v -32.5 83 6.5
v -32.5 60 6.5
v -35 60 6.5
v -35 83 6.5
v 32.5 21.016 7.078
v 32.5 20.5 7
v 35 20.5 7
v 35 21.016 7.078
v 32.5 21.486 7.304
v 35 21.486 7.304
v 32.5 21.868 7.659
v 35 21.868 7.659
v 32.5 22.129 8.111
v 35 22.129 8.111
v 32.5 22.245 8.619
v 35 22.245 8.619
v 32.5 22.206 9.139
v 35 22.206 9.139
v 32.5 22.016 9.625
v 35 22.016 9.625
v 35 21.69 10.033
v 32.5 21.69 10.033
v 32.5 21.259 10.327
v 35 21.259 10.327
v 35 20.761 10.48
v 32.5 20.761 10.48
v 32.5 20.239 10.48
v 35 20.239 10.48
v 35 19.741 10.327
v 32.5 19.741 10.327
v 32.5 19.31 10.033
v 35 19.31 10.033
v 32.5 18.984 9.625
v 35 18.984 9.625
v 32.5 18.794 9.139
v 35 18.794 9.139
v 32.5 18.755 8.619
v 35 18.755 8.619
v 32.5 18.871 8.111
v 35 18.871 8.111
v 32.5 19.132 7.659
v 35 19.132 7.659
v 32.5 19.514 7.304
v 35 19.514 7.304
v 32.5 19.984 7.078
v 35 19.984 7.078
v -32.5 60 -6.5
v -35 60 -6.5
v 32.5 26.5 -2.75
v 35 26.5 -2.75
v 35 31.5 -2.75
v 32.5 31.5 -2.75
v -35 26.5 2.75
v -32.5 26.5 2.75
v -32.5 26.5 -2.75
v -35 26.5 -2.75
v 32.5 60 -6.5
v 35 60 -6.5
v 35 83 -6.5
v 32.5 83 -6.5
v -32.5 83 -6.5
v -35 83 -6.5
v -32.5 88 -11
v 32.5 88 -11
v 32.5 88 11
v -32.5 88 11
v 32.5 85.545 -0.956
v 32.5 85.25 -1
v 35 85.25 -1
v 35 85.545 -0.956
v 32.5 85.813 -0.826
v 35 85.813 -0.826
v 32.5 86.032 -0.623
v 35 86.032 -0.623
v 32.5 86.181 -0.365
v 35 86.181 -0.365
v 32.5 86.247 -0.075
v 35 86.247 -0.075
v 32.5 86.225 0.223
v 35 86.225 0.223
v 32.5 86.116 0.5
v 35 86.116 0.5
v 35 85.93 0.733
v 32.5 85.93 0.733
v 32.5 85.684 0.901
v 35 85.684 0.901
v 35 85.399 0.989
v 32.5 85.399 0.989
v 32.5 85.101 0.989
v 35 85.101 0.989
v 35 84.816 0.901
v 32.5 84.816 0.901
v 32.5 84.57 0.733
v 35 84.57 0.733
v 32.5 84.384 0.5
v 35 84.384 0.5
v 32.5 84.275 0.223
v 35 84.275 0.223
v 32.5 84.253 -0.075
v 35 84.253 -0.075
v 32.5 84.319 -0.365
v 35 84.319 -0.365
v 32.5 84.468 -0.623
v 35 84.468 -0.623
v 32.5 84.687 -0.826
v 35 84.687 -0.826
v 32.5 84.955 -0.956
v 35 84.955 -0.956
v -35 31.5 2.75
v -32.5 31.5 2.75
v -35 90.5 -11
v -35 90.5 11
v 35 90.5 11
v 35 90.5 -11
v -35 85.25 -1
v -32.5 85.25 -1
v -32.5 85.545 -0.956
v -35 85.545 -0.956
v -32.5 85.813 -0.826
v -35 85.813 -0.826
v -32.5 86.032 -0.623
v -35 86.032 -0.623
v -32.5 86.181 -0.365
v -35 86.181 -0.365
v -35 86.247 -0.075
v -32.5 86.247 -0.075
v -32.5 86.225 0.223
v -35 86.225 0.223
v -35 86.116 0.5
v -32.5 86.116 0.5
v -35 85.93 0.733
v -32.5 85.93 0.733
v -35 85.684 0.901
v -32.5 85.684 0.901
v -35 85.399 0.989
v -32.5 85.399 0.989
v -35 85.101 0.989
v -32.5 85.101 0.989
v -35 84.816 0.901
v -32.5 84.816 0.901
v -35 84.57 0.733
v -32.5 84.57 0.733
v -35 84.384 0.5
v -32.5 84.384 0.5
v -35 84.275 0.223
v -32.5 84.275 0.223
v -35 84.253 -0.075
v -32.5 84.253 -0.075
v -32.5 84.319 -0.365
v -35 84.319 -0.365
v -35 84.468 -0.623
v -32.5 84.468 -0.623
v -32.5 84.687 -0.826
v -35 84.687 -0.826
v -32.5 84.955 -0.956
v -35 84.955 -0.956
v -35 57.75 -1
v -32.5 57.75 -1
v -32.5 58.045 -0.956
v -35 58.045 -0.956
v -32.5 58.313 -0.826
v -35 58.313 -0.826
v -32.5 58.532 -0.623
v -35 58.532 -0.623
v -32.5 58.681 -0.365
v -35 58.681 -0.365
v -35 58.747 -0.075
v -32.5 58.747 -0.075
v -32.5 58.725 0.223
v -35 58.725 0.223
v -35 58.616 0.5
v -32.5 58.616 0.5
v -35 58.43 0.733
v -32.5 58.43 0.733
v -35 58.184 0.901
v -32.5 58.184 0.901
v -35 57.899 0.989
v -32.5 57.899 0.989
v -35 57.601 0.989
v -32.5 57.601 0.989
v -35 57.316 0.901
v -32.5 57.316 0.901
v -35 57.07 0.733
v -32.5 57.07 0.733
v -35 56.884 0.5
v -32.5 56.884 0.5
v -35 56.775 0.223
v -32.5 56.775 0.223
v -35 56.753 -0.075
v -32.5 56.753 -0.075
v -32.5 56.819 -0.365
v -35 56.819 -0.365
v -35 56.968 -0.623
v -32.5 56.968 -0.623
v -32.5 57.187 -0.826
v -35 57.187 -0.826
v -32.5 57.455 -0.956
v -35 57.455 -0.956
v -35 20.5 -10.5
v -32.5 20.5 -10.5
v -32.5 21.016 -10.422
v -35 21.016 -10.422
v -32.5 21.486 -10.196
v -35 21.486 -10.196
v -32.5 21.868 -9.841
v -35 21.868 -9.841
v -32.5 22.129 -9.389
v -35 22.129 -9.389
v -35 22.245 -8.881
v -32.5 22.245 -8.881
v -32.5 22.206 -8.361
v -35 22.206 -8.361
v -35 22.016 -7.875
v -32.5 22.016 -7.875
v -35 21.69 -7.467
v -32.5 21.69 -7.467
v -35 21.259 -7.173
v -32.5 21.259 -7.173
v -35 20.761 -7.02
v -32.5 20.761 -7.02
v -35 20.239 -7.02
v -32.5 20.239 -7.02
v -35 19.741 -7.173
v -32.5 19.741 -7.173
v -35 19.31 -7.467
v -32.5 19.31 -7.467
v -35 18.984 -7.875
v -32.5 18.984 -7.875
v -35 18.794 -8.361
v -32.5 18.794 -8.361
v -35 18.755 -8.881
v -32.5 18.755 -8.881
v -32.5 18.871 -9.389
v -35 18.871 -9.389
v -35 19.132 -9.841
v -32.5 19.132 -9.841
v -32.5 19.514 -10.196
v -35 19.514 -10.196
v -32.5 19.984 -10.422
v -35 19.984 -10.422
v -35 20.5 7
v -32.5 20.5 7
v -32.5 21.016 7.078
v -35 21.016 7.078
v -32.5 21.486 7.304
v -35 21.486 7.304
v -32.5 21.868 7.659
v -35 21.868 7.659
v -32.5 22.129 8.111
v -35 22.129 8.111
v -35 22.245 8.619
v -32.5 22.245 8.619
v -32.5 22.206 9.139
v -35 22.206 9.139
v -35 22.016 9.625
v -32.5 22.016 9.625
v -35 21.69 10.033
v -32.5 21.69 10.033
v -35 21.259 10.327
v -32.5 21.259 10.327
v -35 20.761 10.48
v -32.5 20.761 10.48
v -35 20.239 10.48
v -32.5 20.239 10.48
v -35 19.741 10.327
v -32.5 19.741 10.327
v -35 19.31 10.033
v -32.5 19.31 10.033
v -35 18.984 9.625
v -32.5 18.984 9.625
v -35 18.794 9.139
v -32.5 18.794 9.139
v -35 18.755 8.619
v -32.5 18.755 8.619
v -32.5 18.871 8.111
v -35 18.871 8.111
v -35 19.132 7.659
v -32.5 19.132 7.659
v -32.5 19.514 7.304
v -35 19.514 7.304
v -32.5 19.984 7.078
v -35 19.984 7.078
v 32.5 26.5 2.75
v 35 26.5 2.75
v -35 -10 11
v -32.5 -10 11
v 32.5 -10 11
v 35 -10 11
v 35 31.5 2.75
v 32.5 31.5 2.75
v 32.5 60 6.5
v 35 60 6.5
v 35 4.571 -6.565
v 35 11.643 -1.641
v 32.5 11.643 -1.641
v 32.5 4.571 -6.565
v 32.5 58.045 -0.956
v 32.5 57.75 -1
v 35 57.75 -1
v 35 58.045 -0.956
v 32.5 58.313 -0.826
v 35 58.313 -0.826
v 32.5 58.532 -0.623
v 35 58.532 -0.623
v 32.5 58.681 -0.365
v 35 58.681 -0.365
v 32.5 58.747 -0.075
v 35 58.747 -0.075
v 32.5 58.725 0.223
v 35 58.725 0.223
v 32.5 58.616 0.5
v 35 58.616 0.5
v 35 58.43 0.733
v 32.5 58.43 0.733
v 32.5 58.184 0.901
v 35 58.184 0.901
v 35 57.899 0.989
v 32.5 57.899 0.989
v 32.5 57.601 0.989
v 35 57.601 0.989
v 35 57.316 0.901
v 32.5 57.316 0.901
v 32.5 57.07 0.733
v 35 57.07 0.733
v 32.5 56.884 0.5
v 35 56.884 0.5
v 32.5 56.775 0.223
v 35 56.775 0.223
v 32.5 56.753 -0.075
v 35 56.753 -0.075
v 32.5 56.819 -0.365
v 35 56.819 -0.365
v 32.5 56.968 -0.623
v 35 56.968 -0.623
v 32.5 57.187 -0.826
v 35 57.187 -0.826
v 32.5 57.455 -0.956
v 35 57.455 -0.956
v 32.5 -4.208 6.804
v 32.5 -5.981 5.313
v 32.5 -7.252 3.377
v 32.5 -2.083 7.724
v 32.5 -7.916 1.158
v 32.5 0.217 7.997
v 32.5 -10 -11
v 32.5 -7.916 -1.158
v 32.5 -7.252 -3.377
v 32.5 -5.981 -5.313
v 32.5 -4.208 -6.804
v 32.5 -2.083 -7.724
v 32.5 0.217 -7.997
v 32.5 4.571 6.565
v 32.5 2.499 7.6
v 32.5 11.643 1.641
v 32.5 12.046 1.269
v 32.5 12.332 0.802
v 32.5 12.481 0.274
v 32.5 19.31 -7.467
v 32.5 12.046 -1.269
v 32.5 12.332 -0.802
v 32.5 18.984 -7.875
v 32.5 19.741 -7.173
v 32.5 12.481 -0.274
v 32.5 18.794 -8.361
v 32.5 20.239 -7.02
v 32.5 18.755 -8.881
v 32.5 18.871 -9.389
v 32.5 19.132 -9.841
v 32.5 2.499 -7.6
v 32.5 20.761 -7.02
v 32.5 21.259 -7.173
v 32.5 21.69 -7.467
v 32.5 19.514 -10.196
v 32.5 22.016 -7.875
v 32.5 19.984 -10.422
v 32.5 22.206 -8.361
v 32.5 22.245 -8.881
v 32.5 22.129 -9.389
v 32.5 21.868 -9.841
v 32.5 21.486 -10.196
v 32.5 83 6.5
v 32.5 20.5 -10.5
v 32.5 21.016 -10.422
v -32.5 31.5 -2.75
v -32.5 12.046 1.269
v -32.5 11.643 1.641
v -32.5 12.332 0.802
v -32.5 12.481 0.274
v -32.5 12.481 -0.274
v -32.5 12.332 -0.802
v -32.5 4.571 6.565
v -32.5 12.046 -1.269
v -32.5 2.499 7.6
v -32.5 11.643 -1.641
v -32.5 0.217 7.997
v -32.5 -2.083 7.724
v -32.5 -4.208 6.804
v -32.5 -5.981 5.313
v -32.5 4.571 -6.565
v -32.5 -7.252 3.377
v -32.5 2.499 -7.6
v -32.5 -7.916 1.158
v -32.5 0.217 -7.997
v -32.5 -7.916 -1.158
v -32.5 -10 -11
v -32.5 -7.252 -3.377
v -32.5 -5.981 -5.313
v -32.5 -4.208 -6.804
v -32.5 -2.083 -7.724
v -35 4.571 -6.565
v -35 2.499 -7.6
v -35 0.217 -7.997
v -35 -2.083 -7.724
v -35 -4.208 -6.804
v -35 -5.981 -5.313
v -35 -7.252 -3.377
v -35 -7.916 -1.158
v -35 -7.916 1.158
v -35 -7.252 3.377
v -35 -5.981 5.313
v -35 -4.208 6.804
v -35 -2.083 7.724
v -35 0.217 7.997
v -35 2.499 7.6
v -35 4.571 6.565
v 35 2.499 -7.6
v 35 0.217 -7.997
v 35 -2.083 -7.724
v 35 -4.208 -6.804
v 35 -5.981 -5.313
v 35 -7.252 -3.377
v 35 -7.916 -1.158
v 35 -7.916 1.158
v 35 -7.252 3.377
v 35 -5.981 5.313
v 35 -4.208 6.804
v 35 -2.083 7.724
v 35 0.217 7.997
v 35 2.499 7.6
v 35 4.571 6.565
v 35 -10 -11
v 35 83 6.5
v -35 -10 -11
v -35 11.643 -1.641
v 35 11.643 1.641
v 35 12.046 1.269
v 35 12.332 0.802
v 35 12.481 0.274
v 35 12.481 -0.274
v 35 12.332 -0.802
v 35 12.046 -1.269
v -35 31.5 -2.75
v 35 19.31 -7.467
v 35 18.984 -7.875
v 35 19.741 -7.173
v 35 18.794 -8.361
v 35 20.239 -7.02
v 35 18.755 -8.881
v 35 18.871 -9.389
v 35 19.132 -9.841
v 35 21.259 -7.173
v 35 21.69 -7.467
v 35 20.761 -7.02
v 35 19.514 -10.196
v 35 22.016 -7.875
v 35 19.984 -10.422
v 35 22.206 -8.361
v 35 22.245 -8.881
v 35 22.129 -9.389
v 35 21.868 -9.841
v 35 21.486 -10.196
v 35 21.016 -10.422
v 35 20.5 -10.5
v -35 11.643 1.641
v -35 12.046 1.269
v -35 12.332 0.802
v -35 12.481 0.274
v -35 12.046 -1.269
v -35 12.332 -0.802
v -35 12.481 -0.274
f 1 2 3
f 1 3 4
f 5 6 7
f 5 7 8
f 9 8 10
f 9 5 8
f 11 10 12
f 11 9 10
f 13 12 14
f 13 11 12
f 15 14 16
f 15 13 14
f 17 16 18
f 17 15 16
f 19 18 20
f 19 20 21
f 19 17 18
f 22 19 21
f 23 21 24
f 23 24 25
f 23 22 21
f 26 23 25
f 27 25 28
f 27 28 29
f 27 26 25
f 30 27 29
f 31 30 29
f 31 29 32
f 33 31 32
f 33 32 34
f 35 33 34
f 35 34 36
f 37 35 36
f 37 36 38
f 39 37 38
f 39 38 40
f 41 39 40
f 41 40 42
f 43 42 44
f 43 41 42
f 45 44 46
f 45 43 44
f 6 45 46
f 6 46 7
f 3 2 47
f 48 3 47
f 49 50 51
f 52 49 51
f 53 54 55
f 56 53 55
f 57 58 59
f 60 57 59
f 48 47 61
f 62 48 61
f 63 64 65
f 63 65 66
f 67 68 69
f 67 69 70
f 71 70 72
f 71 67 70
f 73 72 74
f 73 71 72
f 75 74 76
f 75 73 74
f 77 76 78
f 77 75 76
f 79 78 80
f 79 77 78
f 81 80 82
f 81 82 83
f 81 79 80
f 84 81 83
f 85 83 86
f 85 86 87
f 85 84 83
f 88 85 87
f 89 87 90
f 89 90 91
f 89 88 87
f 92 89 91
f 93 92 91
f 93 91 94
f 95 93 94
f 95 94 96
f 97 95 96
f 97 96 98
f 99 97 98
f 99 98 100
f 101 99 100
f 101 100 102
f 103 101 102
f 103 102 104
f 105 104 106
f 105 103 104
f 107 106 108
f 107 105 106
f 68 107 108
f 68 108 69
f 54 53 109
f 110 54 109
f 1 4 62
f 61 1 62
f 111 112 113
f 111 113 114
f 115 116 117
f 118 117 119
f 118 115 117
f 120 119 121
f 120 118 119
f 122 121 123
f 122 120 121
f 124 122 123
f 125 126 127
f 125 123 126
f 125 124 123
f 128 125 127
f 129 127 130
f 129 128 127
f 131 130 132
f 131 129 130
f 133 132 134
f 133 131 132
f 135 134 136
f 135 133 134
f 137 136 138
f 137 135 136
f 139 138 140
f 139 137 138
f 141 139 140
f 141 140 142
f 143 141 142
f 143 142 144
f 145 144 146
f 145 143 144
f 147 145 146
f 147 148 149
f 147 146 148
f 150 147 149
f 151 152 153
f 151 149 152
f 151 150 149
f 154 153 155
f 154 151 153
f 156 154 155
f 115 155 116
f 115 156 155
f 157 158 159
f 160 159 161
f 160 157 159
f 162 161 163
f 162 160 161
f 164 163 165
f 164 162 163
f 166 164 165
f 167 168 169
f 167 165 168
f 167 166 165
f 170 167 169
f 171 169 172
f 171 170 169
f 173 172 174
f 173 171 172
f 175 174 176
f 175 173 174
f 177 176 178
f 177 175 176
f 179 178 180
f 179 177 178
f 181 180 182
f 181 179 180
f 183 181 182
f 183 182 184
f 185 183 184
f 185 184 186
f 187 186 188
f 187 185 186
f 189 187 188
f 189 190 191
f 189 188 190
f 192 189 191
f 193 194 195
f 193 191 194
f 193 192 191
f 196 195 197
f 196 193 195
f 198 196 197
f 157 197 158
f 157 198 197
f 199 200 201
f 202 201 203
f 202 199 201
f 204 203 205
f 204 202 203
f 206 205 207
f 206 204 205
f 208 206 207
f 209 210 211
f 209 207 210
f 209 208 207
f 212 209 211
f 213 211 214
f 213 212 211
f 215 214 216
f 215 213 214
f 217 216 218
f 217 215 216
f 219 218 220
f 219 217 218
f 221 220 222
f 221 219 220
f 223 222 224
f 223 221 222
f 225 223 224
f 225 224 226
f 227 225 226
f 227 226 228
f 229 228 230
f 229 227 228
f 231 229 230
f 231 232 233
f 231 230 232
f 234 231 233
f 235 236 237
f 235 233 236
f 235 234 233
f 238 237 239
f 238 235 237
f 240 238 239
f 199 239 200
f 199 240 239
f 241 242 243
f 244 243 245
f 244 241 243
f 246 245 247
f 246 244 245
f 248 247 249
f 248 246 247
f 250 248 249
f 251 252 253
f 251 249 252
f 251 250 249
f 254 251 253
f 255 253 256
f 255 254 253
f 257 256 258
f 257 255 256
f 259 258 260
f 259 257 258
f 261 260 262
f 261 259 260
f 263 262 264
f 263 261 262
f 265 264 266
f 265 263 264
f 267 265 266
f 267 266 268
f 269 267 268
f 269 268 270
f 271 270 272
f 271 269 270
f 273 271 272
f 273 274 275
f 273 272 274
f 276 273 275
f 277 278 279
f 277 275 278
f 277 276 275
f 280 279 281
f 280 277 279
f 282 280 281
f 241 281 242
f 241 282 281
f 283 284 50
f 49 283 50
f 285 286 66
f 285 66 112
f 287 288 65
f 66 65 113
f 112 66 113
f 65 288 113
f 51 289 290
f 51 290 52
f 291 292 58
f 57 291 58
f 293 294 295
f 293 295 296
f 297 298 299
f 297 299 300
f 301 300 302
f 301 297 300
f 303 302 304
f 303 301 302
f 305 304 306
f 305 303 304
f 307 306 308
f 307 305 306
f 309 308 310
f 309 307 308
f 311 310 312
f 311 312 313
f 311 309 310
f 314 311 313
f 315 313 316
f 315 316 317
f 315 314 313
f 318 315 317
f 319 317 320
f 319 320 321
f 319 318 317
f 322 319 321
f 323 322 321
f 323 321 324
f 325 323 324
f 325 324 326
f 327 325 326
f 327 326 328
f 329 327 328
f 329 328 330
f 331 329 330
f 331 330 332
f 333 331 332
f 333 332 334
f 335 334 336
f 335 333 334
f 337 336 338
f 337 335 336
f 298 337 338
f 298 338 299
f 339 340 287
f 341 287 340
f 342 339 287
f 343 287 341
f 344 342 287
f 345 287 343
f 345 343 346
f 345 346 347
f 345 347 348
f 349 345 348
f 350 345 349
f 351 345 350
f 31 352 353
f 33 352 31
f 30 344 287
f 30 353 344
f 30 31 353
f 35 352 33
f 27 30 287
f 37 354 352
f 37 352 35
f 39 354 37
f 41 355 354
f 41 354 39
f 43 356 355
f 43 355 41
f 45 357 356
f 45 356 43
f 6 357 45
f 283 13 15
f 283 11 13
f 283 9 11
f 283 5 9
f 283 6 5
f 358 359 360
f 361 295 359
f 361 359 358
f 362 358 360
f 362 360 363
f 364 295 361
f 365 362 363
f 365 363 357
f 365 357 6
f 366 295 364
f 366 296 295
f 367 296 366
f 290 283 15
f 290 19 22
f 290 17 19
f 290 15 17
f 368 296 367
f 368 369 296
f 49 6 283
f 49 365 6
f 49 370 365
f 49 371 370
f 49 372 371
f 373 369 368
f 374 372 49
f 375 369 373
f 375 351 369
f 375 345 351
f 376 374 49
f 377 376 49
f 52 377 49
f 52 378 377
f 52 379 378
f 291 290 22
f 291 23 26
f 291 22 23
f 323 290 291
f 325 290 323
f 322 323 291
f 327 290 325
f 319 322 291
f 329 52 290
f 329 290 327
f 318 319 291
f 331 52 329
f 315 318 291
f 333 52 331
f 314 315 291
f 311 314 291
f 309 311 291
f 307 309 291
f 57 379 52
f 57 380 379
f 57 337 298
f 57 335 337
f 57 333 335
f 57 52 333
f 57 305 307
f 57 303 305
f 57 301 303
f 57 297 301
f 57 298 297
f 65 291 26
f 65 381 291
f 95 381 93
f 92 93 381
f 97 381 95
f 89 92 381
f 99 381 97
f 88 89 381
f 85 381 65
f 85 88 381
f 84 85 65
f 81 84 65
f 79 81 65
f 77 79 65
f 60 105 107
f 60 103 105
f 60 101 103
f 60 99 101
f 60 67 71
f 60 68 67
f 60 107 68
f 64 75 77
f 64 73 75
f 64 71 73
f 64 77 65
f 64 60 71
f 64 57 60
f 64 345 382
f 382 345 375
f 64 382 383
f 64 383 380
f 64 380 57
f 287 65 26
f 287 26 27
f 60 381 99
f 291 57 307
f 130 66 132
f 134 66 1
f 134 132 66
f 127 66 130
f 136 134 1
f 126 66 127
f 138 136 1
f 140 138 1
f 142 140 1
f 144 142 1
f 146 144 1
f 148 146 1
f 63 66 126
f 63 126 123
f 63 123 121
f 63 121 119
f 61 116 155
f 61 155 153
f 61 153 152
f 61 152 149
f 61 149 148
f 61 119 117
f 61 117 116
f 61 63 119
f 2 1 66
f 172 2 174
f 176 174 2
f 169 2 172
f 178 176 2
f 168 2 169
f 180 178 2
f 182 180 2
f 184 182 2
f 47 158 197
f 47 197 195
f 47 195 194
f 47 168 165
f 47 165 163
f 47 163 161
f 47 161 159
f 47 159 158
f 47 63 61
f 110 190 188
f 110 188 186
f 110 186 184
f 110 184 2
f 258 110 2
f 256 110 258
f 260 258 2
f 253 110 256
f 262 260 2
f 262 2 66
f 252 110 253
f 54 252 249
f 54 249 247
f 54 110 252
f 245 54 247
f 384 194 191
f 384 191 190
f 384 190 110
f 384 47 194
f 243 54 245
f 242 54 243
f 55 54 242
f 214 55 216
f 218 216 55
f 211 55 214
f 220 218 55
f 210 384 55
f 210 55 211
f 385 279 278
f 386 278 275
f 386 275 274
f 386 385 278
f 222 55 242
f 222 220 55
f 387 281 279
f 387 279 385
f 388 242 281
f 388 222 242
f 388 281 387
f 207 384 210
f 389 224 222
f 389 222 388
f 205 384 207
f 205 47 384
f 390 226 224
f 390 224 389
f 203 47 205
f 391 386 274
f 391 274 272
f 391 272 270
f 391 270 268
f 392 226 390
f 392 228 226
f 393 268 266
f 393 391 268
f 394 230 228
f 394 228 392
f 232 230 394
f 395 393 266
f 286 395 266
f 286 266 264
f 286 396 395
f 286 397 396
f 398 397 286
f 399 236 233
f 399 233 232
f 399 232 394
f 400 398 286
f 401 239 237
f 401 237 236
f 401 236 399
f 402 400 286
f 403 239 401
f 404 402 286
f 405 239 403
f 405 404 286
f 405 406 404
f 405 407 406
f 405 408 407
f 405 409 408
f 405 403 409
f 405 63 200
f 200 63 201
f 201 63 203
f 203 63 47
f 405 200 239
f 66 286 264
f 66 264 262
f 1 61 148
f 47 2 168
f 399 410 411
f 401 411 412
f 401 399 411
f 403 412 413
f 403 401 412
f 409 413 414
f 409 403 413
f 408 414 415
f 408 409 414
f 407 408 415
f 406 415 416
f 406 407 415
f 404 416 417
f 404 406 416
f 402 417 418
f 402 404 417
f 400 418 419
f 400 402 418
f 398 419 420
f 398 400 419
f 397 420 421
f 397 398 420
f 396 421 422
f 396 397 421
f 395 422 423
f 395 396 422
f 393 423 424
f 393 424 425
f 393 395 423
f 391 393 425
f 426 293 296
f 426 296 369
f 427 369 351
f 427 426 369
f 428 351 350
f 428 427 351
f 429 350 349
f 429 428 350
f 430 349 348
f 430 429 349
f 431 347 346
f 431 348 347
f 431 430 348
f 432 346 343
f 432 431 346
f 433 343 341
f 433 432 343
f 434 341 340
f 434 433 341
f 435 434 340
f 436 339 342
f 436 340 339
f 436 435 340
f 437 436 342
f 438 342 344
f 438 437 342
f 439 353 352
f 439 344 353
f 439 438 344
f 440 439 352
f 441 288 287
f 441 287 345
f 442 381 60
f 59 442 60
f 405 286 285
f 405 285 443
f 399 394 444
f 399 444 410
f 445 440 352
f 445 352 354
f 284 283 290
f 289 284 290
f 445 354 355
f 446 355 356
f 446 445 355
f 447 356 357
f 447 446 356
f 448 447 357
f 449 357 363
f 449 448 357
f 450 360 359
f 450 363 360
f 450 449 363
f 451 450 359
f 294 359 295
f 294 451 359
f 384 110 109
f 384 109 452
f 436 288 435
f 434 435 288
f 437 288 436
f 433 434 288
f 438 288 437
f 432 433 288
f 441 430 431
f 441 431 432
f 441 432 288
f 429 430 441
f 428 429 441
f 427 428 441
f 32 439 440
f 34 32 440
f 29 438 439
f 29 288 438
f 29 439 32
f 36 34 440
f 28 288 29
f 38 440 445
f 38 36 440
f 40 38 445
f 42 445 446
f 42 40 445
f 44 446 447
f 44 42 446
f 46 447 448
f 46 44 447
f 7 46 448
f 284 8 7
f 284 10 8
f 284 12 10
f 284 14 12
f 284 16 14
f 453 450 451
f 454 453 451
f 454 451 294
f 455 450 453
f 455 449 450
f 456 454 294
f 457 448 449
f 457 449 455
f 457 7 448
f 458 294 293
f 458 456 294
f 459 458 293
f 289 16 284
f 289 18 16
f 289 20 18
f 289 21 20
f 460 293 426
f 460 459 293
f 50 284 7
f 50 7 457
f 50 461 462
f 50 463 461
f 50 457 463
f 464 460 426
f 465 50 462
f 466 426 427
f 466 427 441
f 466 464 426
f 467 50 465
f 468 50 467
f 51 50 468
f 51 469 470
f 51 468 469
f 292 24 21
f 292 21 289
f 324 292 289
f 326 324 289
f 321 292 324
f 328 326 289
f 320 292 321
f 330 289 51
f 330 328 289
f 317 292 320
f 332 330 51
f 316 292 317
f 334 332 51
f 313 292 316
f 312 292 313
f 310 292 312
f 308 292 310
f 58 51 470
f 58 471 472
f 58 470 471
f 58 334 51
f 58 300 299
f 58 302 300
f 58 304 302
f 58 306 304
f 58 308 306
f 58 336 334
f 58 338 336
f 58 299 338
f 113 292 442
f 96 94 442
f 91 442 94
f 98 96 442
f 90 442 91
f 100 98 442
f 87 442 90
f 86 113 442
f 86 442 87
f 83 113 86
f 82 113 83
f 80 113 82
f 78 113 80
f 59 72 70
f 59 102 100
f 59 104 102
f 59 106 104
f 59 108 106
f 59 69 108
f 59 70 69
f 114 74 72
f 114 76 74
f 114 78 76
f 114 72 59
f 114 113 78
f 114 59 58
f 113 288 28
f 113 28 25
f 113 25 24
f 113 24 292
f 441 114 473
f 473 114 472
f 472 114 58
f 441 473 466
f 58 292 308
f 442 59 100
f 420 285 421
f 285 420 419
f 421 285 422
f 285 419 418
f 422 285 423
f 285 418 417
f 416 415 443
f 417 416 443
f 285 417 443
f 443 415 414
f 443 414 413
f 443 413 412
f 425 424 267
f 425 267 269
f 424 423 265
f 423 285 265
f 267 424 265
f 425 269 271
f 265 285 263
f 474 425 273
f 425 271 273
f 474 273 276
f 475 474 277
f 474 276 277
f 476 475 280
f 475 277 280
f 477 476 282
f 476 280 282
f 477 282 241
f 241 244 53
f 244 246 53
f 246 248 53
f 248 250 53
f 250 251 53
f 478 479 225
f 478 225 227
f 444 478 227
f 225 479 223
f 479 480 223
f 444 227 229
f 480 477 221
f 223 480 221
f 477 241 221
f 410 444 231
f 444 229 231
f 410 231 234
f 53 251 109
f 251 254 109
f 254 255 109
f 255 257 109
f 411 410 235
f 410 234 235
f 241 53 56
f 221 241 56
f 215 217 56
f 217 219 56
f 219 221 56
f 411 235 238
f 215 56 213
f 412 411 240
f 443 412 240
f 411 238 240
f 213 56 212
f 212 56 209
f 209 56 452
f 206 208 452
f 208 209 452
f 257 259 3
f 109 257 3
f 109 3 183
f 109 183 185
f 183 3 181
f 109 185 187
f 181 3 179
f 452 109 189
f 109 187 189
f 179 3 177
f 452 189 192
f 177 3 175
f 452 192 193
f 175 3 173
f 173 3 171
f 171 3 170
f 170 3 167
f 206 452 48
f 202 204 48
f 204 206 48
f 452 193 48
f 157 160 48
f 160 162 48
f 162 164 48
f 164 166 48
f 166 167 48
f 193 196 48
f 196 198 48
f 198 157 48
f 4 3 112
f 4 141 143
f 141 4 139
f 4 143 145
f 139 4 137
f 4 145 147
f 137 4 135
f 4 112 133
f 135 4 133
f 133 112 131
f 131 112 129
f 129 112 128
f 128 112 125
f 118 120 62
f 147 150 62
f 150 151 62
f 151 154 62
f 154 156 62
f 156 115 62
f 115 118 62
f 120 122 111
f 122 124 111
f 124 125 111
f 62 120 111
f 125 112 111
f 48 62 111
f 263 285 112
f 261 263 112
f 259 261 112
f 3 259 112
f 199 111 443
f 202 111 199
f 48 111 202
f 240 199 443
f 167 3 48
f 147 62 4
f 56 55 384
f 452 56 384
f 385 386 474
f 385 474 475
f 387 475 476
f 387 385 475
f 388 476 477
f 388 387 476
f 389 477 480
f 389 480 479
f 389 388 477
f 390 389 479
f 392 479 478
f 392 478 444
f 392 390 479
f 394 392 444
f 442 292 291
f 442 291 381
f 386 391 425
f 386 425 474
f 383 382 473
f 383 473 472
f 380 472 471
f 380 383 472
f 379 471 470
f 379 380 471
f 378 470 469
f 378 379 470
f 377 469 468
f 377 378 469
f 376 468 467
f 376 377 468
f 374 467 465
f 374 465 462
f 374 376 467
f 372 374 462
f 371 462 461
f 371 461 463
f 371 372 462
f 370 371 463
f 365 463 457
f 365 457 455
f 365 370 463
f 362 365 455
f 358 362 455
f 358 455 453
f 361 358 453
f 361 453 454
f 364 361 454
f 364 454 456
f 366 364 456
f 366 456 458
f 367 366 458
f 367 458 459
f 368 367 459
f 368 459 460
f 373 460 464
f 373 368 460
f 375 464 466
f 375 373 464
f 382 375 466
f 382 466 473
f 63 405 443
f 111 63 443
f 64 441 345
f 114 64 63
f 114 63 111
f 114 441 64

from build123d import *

# Parameters (mm, degrees)
CROQUIS1_W                 = 22
CROQUIS1_H                 = 100.5
CROQUIS1_R                 = 1.75
CROQUIS1_R_2               = 1
CROQUIS1_W_2               = 13
CROQUIS1_H_2               = 23
CROQUIS1_W_3               = 5.5
CROQUIS1_H_3               = 5
SALIENTE_EXTRUIR1_DEPTH    = 35
CORTAR_EXTRUIR2_DEPTH      = 100.494974747
CORTAR_EXTRUIR2_DEPTH_BACK = 100.494974747


with BuildPart() as part:
    # Croquis1 → Saliente-Extruir1 (new, symmetric)
    with BuildSketch(Plane(origin=(0, 0, 0), x_dir=(0, 0, -1), z_dir=(1, 0, 0))):
        with Locations((0, 40.25)):
            Rectangle(CROQUIS1_W, CROQUIS1_H)
        with Locations((-8.75, 20.5)):
            Circle(CROQUIS1_R, mode=Mode.SUBTRACT)
        with Locations((8.75, 20.5)):
            Circle(CROQUIS1_R, mode=Mode.SUBTRACT)
        with Locations((0, 85.25)):
            Circle(CROQUIS1_R_2, mode=Mode.SUBTRACT)
        with Locations((0, 57.75)):
            Circle(CROQUIS1_R_2, mode=Mode.SUBTRACT)
        with BuildLine():
            Line((-6.565214453, 4.571428571), (-1.641303613, 11.642857143))
            ThreePointArc((-1.641303613, 11.642857143), (0, 12.5), (1.641303613, 11.642857143))
            Line((1.641303613, 11.642857143), (6.565214453, 4.571428571))
            ThreePointArc((6.565214453, 4.571428571), (0, -8), (-6.565214453, 4.571428571))
        make_face(mode=Mode.SUBTRACT)
        with Locations((0, 71.5)):
            Rectangle(CROQUIS1_W_2, CROQUIS1_H_2, mode=Mode.SUBTRACT)
        with Locations((0, 29)):
            Rectangle(CROQUIS1_W_3, CROQUIS1_H_3, mode=Mode.SUBTRACT)
    extrude(amount=SALIENTE_EXTRUIR1_DEPTH, both=True)

    # Croquis2 → Cortar-Extruir2 (cut, two sides: drawn at the far end of the back side and taken through both)
    with BuildSketch(Plane.XY.offset(11).offset(-CORTAR_EXTRUIR2_DEPTH_BACK)):
        Polygon((32.5, -262.128065288), (32.5, -10), (32.5, 88), (-32.5, 88), (-32.5, -10), (-32.5, -262.128065288), (-32.5, -766.384195863), (32.5, -766.384195863), align=None)
    extrude(amount=CORTAR_EXTRUIR2_DEPTH + CORTAR_EXTRUIR2_DEPTH_BACK, mode=Mode.SUBTRACT)


solid = part.part
